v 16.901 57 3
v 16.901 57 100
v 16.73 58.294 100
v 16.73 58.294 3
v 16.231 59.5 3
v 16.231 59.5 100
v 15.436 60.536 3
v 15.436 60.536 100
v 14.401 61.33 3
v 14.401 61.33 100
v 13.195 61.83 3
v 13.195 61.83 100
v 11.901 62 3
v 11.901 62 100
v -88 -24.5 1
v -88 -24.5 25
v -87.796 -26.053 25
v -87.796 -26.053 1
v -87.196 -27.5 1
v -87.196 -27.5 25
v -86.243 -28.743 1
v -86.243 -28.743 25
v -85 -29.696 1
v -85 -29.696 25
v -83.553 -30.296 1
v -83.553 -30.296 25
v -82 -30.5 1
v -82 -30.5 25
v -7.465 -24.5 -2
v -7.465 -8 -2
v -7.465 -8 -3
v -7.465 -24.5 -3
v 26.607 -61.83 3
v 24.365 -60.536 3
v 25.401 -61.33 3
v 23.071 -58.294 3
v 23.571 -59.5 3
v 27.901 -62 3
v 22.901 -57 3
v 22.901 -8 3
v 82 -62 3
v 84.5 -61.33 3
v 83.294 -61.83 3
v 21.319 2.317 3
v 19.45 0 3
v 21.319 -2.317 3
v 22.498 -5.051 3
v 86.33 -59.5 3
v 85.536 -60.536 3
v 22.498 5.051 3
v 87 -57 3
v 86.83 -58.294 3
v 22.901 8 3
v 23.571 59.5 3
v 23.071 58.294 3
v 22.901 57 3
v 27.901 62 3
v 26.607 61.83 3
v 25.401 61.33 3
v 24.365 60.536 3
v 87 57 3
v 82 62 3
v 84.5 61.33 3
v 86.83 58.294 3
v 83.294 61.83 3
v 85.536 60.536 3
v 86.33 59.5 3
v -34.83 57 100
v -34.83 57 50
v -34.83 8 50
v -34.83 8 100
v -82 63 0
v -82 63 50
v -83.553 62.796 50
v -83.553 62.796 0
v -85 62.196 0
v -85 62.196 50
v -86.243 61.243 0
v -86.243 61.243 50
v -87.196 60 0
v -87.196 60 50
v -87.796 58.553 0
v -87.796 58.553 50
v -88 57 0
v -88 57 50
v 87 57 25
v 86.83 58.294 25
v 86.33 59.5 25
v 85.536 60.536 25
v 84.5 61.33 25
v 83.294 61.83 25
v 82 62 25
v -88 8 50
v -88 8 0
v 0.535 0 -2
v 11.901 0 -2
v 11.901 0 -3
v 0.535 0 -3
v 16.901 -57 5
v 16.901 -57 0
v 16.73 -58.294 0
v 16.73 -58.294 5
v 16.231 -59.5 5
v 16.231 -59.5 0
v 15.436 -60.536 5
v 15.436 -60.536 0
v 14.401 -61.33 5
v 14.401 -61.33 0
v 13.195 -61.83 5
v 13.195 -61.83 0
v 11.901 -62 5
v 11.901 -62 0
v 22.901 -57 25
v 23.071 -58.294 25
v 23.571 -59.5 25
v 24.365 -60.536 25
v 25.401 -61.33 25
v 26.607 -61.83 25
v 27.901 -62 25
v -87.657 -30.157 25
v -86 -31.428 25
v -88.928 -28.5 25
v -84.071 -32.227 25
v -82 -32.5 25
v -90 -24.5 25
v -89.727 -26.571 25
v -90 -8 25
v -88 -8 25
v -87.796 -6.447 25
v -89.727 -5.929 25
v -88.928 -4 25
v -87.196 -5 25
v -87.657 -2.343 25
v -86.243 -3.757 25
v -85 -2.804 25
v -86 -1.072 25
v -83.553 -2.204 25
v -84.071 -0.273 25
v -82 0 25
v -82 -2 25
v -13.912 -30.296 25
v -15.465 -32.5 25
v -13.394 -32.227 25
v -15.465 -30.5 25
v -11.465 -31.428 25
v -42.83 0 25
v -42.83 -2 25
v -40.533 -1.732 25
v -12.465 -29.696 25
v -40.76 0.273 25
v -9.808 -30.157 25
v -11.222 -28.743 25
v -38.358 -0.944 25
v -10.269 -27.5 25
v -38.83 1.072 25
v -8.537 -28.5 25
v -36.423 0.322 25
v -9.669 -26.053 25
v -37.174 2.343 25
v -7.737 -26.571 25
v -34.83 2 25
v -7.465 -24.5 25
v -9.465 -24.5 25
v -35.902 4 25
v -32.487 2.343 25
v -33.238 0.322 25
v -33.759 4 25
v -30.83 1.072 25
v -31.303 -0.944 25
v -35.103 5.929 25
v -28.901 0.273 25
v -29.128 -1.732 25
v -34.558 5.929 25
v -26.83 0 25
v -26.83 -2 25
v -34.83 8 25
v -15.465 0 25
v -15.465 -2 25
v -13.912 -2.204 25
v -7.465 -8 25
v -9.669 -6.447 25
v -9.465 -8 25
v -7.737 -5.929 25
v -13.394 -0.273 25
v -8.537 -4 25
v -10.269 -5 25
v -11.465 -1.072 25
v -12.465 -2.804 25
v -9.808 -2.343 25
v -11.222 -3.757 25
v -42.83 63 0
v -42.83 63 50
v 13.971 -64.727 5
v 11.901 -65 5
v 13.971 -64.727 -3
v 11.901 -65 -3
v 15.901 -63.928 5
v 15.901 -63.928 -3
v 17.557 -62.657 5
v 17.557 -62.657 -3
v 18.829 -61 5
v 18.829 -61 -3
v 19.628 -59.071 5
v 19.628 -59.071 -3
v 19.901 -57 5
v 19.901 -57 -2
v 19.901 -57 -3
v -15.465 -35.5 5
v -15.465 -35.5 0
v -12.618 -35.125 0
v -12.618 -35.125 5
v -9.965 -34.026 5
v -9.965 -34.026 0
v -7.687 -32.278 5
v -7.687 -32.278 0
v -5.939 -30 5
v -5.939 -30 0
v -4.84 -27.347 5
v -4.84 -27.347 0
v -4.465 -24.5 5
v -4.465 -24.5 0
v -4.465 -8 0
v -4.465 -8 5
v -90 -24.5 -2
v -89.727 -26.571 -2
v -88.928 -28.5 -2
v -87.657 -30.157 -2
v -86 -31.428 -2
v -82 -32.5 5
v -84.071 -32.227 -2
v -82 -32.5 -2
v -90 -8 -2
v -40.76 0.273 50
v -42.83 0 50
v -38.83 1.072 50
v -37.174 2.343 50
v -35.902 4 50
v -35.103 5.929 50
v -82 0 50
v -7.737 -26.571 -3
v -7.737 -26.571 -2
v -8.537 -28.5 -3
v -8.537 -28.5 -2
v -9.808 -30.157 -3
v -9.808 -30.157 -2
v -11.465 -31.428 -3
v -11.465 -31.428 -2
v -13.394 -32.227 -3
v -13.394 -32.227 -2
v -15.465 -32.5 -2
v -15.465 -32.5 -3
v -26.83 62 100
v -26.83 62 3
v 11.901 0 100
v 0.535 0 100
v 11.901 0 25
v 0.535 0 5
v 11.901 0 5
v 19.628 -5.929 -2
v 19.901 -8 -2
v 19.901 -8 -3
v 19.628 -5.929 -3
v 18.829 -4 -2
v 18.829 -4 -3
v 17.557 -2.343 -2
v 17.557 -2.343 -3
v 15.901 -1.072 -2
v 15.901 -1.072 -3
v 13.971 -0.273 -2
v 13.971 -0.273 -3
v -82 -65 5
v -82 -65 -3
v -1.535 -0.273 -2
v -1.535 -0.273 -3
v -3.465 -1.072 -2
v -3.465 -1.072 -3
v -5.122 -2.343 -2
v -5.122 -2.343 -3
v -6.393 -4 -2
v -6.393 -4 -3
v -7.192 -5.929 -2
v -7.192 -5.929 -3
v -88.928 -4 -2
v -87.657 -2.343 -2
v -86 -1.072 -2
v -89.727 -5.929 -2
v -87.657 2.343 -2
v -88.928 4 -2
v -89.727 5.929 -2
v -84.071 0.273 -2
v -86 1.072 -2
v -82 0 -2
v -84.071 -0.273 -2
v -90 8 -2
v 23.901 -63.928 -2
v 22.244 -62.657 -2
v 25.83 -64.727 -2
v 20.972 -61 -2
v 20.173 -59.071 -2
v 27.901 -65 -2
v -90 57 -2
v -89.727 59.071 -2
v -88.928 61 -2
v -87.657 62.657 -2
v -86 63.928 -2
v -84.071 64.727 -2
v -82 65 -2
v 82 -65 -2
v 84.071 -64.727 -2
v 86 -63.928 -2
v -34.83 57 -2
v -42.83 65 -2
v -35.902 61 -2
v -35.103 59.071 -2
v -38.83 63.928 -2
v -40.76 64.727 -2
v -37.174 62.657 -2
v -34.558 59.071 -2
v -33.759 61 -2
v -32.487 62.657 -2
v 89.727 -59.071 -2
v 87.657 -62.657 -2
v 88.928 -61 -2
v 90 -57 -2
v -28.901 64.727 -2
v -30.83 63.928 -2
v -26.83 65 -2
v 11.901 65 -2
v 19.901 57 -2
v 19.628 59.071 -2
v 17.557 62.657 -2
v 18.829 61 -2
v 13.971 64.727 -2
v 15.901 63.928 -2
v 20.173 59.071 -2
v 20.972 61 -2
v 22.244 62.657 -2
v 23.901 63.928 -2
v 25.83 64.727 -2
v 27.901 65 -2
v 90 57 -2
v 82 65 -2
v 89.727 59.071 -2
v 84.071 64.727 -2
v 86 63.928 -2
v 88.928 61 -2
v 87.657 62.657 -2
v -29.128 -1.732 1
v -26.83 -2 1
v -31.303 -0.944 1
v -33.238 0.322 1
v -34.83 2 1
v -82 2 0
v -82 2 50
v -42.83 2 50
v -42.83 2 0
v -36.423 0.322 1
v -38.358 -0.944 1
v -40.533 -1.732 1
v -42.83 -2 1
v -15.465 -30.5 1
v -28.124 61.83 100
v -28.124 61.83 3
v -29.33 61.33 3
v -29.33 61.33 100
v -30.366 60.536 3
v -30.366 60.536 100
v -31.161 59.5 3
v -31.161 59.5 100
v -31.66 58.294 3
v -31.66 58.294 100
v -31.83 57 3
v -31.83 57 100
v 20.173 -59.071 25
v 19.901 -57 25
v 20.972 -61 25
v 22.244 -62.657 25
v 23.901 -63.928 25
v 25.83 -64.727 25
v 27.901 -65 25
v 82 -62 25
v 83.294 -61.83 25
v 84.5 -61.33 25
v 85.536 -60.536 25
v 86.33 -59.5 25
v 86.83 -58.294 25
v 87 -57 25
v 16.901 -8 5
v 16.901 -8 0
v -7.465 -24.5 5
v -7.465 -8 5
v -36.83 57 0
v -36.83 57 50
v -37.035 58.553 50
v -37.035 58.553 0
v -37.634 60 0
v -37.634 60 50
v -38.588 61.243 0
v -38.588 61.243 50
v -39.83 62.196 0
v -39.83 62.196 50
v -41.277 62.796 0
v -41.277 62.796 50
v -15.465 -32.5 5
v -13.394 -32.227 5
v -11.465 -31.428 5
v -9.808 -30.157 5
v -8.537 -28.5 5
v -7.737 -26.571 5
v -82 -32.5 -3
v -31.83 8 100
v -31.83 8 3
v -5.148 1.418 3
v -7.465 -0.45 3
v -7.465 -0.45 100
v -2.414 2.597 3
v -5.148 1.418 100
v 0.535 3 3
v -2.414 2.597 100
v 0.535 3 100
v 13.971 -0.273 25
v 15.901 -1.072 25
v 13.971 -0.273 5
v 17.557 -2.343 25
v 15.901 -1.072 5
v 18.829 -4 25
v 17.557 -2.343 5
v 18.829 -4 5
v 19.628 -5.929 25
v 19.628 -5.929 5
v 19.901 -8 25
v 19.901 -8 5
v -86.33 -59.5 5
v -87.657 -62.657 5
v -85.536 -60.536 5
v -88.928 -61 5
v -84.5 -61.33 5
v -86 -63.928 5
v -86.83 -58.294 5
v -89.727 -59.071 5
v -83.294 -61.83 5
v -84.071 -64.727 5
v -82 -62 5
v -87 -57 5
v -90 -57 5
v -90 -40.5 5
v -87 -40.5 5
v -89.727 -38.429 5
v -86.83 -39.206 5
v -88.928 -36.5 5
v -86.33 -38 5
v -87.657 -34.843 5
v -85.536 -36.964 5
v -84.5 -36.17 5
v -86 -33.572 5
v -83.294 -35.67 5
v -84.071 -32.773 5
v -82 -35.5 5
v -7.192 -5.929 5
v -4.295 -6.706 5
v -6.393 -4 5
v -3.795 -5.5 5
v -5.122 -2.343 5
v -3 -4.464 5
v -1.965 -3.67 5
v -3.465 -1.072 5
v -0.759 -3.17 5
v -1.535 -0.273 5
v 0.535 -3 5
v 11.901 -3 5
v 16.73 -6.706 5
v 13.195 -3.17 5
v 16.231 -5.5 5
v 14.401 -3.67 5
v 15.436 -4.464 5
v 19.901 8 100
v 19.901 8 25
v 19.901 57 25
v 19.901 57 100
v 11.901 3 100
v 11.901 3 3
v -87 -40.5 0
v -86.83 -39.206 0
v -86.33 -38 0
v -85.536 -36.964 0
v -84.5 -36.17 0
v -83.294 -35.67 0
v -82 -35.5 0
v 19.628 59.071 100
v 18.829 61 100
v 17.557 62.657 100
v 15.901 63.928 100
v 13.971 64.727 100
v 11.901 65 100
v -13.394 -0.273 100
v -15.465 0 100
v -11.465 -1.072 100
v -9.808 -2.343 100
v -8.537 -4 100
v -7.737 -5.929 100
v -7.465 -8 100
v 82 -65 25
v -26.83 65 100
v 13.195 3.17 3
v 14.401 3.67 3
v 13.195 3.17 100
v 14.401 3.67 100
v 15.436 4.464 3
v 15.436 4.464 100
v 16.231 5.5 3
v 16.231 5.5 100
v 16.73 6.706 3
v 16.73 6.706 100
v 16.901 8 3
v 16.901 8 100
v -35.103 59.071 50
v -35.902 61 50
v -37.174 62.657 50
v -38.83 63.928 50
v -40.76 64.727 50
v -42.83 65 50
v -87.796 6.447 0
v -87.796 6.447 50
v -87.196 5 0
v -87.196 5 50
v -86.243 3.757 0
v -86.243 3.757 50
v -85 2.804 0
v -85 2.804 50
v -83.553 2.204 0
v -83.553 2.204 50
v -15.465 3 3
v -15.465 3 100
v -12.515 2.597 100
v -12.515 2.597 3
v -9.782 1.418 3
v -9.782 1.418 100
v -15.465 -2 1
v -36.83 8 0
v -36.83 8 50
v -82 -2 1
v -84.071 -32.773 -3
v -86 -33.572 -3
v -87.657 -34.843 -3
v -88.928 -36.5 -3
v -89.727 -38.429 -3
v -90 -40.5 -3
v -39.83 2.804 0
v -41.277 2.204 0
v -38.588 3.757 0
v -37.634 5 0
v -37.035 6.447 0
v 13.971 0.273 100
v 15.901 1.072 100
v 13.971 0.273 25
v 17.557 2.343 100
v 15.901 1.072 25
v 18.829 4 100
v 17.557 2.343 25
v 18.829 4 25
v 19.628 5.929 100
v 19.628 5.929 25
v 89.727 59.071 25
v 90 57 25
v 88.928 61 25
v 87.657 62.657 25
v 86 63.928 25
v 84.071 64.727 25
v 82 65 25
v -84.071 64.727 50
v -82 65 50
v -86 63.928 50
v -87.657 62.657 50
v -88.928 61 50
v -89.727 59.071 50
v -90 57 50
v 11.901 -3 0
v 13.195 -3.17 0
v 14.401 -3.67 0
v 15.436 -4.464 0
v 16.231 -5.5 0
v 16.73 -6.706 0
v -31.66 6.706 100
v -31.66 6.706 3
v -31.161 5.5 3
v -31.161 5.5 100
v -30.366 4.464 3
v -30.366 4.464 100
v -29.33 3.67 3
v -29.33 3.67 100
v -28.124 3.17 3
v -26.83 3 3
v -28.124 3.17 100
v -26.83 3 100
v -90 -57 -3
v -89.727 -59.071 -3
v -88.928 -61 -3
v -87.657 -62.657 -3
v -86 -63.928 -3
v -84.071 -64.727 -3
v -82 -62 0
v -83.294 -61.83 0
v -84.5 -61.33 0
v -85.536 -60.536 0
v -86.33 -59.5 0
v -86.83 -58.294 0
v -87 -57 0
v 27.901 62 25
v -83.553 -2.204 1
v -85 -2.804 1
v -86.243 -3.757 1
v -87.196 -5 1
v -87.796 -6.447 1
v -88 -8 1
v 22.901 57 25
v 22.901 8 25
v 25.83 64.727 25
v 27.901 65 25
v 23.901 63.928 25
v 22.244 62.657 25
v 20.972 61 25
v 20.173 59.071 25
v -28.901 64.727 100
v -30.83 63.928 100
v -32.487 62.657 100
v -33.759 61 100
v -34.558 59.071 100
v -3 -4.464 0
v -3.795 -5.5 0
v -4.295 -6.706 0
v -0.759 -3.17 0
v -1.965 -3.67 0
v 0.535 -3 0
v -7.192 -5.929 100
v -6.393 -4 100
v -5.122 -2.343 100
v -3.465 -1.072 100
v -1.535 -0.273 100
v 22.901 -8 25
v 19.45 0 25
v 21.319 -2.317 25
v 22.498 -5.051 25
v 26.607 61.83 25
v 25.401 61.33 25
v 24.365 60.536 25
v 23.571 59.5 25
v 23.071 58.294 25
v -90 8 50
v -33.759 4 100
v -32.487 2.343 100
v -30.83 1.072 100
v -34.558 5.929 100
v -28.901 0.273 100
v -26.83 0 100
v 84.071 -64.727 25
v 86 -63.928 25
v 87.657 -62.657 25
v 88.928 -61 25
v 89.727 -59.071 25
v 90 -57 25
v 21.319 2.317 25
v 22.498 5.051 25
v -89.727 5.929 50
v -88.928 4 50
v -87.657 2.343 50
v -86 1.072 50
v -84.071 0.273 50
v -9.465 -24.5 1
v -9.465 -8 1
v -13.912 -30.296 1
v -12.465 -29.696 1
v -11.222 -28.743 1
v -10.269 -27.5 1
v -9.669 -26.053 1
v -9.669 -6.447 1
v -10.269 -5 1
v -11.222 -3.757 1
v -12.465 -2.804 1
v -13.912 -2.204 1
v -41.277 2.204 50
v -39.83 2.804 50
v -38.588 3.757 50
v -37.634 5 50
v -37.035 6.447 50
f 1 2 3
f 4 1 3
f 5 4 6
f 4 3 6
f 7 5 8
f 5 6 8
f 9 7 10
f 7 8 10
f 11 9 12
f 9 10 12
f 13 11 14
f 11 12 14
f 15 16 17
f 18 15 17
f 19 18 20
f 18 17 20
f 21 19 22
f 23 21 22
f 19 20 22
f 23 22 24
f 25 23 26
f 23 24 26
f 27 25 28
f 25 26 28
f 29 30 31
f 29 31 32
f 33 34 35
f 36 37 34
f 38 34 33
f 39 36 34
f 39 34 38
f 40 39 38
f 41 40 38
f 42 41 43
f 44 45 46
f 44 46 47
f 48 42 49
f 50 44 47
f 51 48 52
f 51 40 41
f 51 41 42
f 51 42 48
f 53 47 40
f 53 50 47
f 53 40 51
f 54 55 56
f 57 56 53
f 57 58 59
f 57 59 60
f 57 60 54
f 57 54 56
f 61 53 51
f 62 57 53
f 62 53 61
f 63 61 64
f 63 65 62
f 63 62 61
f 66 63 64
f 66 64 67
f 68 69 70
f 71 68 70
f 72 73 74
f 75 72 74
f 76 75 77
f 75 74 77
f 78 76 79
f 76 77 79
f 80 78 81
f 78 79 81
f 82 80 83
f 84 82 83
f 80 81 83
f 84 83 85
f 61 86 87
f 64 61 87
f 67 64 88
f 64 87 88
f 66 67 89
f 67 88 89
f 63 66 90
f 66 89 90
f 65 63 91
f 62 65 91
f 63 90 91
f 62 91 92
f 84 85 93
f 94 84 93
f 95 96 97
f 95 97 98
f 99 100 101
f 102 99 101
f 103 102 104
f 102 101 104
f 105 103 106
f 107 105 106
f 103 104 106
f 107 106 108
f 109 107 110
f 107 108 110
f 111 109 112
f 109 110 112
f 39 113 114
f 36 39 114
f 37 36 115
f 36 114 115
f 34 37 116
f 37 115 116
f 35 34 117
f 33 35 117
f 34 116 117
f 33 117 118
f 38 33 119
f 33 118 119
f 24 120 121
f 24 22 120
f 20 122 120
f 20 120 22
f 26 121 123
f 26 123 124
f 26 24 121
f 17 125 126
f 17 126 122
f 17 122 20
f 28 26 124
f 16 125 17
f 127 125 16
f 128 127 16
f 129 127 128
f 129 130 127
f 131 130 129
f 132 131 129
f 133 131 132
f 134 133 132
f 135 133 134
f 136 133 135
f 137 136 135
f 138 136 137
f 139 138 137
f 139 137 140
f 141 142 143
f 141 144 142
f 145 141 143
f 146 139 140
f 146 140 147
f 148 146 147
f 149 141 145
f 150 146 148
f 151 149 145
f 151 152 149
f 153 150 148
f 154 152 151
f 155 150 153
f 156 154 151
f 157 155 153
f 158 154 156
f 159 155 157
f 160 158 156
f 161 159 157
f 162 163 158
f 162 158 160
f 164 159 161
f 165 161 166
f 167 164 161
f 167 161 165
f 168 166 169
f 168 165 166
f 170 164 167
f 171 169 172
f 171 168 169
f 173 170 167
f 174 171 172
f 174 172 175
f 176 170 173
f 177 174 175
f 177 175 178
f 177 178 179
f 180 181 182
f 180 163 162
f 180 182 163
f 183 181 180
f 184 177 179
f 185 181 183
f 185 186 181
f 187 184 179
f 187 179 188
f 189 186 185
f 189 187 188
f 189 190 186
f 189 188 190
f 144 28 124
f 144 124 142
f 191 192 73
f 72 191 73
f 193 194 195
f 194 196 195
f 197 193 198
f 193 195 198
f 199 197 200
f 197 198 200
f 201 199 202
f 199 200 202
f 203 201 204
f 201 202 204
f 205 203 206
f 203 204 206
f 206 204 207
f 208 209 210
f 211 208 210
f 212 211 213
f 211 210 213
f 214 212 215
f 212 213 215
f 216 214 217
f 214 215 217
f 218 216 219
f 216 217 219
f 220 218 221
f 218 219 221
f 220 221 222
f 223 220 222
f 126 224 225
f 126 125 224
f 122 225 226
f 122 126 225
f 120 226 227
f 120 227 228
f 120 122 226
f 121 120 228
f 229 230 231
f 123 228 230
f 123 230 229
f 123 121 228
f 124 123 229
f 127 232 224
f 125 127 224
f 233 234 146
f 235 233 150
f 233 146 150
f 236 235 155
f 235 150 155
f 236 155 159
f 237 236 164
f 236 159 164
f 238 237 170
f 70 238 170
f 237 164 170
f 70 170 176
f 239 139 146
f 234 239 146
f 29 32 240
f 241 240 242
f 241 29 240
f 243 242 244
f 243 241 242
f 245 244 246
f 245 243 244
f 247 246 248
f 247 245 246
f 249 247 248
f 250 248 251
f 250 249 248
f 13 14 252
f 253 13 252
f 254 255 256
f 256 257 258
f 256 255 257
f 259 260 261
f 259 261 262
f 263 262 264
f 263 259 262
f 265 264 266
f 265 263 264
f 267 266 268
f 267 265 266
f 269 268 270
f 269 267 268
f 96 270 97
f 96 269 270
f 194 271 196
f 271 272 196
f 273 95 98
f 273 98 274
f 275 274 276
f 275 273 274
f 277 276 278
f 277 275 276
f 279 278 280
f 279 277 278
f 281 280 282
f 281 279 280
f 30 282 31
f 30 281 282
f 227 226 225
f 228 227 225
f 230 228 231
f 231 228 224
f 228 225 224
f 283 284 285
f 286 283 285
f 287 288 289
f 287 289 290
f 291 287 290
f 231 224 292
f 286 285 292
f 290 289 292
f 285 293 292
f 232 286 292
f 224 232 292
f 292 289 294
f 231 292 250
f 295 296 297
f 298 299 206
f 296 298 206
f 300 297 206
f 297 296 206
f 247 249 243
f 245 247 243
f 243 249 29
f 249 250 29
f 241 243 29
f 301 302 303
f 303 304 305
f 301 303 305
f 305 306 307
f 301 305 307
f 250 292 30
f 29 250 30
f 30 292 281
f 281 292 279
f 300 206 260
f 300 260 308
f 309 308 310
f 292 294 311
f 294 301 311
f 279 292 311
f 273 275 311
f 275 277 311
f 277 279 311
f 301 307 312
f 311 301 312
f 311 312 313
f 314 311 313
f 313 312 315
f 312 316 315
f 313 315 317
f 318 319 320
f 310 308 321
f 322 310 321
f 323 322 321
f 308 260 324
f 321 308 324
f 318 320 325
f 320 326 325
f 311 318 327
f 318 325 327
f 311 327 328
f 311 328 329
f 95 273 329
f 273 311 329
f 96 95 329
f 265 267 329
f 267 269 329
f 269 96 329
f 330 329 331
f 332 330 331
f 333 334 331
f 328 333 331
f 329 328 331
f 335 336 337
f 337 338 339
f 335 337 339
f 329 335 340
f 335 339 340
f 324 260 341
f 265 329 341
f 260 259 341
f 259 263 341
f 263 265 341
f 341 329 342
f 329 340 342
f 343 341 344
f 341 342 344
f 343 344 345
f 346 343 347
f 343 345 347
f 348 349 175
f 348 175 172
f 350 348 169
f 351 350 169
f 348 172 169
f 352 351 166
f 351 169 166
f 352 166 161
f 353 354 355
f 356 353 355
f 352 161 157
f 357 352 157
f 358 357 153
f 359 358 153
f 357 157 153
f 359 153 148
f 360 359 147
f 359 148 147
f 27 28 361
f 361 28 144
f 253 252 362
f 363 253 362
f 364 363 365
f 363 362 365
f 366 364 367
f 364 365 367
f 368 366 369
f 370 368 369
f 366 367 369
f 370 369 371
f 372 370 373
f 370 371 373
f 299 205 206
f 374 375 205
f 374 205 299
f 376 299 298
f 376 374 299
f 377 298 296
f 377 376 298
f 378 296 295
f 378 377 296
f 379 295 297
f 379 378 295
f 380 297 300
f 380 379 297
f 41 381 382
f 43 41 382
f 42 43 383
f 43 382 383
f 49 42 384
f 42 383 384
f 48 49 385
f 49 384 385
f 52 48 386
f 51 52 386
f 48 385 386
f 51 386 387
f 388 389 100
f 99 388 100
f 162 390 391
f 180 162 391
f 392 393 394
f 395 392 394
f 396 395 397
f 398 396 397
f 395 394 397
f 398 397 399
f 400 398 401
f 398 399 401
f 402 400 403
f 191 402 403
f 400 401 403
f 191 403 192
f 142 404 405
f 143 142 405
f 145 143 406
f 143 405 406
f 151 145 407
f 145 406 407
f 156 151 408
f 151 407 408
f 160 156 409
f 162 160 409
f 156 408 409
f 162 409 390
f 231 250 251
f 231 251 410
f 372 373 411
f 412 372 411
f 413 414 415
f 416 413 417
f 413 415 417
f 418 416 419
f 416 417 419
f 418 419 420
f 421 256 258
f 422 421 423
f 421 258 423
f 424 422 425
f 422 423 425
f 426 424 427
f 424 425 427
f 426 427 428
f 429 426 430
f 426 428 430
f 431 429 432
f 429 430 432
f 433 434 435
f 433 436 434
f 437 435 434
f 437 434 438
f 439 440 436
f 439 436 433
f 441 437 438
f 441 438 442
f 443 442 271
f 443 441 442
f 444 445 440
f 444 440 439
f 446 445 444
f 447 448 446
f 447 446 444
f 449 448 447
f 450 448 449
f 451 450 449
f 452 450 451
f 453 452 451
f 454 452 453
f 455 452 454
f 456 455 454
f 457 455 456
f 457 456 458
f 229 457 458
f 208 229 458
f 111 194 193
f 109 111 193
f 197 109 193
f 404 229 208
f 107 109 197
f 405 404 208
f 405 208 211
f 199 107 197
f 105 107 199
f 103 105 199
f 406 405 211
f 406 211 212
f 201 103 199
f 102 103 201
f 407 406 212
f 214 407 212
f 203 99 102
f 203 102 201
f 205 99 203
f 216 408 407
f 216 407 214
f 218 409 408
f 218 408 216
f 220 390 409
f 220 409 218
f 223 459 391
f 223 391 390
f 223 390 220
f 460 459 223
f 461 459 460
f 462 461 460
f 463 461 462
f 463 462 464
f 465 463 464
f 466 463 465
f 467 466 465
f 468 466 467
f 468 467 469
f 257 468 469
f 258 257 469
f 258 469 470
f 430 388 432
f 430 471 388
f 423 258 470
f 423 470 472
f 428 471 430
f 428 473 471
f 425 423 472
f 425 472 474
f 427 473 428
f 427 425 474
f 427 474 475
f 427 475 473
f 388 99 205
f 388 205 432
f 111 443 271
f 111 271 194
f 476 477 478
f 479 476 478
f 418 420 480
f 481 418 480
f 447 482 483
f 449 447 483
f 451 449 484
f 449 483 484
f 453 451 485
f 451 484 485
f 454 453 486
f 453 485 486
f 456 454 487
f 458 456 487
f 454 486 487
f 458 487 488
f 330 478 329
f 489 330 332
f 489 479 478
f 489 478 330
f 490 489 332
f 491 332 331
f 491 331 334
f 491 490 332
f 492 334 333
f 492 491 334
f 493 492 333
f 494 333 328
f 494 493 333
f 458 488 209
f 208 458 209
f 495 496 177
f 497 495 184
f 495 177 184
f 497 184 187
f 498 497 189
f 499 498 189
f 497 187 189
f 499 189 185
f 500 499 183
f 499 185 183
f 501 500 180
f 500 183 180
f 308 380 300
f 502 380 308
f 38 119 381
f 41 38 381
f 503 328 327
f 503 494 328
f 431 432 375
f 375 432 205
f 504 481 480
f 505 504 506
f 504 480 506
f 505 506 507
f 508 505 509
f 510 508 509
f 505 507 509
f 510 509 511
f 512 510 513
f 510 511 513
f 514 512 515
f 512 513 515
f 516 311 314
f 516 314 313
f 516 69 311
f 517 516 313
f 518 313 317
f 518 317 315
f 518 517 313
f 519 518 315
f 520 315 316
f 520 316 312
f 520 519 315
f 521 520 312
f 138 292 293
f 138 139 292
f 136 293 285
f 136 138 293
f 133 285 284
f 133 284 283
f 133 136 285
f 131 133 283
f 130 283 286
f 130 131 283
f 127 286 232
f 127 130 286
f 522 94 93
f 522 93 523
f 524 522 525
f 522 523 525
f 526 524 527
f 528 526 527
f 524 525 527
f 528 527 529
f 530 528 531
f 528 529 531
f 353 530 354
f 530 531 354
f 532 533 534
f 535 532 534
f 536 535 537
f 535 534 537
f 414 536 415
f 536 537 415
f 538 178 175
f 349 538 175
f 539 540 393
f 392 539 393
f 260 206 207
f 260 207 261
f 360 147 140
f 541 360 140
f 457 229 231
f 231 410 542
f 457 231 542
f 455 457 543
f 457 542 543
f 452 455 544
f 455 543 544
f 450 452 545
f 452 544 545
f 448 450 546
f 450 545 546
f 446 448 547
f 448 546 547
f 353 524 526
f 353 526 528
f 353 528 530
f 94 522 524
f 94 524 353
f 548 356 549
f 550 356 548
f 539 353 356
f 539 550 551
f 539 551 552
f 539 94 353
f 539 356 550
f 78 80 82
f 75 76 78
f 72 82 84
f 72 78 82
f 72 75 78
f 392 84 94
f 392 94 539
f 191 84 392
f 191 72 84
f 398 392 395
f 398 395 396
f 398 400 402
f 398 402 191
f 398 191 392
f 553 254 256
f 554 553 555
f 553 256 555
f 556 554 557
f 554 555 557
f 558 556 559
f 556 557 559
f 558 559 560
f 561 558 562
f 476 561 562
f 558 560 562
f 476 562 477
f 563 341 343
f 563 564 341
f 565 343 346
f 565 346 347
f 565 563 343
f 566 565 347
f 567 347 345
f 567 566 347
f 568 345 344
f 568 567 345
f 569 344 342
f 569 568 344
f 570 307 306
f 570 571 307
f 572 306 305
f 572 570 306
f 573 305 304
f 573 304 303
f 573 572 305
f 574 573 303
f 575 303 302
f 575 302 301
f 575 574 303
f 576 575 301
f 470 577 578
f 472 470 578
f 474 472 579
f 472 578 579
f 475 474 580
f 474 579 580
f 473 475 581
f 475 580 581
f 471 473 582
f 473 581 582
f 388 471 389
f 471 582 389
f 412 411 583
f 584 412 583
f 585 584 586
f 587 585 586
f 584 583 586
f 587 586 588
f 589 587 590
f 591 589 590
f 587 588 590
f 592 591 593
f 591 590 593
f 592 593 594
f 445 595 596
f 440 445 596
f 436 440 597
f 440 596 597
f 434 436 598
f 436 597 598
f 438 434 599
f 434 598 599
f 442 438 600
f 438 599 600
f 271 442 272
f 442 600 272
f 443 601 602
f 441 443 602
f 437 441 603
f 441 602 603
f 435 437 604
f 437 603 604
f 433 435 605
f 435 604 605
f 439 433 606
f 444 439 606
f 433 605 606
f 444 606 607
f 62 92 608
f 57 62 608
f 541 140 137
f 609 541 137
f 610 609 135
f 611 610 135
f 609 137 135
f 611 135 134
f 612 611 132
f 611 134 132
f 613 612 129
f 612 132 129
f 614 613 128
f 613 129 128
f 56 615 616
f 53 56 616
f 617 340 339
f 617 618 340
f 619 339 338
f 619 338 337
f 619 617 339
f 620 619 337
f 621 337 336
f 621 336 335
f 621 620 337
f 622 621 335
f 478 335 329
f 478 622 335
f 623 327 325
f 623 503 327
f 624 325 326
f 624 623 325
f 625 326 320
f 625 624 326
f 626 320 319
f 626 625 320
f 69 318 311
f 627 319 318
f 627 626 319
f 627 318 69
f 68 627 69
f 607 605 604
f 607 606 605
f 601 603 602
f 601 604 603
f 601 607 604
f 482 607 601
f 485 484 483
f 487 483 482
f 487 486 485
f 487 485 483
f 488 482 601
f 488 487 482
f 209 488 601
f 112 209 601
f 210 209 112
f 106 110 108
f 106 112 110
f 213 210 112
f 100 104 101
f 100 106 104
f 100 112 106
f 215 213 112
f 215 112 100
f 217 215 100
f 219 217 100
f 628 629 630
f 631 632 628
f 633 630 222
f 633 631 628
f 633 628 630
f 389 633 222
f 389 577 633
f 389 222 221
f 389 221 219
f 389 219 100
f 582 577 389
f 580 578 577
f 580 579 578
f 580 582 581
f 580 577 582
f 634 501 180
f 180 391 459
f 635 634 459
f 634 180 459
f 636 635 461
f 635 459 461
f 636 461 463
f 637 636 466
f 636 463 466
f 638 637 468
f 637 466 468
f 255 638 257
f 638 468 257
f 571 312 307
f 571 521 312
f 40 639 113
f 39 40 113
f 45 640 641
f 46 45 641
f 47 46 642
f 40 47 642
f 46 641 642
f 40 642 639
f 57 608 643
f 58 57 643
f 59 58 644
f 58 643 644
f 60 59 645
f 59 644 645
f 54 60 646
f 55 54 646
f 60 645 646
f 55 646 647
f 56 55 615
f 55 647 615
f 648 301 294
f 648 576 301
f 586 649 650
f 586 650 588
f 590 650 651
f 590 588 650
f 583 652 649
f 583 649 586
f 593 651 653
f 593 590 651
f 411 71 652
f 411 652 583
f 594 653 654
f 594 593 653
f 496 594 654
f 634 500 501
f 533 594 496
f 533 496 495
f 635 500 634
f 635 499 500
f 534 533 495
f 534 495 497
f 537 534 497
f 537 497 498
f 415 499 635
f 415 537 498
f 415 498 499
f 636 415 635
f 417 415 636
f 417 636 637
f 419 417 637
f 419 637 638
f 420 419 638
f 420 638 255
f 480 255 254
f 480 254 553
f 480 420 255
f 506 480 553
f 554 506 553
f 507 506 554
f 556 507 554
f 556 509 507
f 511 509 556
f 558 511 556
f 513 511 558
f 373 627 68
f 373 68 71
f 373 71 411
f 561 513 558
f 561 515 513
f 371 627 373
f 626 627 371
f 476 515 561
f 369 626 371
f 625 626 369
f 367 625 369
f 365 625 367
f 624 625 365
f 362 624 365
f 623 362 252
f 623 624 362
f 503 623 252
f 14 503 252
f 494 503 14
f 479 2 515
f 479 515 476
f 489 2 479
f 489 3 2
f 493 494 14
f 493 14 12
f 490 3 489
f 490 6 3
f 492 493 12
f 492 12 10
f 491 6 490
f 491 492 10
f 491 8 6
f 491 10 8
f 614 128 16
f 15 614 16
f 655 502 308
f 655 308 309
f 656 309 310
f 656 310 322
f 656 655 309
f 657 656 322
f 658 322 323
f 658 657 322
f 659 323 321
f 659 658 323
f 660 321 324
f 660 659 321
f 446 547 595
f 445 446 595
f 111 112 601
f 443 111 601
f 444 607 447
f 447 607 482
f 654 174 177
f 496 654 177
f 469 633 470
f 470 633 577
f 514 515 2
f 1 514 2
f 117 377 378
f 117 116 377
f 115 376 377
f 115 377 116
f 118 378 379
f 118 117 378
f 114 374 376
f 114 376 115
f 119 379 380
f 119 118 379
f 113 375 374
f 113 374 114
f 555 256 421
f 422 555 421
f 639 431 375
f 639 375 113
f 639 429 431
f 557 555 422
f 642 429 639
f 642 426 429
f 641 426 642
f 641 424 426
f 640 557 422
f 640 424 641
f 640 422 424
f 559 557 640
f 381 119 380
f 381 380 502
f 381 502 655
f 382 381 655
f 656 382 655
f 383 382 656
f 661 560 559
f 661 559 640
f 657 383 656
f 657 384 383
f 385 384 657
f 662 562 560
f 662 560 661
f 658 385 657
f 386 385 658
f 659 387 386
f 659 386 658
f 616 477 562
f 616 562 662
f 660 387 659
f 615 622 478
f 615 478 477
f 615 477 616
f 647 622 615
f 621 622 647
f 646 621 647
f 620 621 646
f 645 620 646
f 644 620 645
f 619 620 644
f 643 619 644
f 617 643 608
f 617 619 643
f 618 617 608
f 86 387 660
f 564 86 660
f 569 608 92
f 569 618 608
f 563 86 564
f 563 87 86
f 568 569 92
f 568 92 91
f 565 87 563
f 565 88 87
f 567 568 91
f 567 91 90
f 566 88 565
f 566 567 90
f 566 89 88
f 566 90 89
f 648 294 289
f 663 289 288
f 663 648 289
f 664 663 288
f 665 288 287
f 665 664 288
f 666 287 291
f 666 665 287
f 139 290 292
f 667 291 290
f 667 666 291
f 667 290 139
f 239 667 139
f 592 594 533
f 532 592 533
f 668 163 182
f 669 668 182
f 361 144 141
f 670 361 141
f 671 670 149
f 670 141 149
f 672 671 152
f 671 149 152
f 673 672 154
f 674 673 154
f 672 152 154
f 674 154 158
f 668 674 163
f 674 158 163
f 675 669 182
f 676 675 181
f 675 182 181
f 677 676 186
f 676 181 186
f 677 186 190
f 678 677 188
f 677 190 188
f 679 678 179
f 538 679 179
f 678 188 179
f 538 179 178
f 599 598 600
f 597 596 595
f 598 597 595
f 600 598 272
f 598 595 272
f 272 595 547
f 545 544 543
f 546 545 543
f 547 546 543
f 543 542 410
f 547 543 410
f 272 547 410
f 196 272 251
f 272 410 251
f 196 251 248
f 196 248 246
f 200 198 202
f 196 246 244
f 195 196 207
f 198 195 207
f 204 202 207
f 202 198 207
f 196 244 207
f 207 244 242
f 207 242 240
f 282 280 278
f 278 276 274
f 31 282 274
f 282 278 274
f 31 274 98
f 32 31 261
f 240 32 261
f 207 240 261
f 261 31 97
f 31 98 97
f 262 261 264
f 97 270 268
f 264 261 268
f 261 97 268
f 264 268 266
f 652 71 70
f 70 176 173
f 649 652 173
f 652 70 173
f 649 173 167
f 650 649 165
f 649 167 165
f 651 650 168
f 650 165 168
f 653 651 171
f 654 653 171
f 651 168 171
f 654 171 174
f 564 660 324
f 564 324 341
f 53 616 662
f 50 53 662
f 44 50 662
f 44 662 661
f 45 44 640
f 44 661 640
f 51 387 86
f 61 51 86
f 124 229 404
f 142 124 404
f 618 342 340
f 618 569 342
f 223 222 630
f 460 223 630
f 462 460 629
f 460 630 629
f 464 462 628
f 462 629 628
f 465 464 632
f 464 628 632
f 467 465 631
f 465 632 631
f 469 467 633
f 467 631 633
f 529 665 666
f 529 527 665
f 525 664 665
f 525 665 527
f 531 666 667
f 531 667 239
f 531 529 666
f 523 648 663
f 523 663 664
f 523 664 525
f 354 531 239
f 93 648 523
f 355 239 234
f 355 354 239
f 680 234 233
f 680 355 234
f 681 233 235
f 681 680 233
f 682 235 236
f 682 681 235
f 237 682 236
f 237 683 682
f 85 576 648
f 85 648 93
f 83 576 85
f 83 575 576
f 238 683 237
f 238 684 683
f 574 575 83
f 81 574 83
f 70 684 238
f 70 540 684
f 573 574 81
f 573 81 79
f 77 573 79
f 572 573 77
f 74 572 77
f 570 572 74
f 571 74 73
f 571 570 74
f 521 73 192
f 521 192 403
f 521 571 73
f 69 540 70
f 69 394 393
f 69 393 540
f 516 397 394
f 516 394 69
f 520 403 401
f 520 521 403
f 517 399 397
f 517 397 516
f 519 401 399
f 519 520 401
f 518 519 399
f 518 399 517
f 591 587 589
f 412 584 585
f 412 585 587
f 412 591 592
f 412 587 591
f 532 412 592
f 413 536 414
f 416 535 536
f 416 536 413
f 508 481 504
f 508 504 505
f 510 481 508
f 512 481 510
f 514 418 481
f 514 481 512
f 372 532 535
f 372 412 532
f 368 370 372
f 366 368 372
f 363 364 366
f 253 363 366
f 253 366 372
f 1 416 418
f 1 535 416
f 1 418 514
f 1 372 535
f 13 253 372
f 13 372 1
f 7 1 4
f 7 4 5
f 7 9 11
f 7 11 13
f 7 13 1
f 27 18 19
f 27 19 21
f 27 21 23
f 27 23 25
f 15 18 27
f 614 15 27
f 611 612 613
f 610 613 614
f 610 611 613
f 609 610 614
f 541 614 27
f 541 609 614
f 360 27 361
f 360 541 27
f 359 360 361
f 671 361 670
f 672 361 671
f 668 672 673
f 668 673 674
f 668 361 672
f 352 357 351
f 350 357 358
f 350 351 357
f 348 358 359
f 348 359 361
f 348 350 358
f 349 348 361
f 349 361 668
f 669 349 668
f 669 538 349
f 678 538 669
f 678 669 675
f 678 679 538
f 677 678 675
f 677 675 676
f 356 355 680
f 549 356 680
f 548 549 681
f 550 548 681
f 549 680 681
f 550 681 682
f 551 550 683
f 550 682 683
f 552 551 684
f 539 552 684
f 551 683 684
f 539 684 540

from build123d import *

# Parameters (mm, degrees)
F1_DEPTH  = 3
F2_DEPTH  = 50
F3_DEPTH  = 100
F4_DEPTH  = 25
F5_DEPTH  = 25
F7_DEPTH  = 22
F8_DEPTH  = 2
F10_DEPTH = 97
F12_DEPTH = 50
F14_DEPTH = 24
F16_DEPTH = 5


with BuildPart() as f1:
    # F0 (on Top) → F1 (new body)
    with BuildSketch(Plane.XY):
        with BuildLine():
            Line((-82, -65), (11.900635, -65))
            ThreePointArc((11.900635, -65), (17.557489, -62.656854), (19.900635, -57))
            Line((19.900635, -57), (19.900635, -8))
            ThreePointArc((19.900635, -8), (17.557489, -2.343146), (11.900635, 0))
            Line((11.900635, 0), (0.535129, 0))
            ThreePointArc((0.535129, 0), (-5.121725, -2.343146), (-7.464871, -8))
            Line((-7.464871, -8), (-7.464871, -24.5))
            ThreePointArc((-7.464871, -24.5), (-9.808017, -30.156854), (-15.464871, -32.5))
            Line((-15.464871, -32.5), (-82, -32.5))
            ThreePointArc((-82, -32.5), (-87.656854, -34.843146), (-90, -40.5))
            Line((-90, -40.5), (-90, -57))
            ThreePointArc((-90, -57), (-87.656854, -62.656854), (-82, -65))
        make_face()
    extrude(amount=-F1_DEPTH)



with BuildPart() as f2:
    # F0 (on Top) → F2 (new body)
    with BuildSketch(Plane.XY):
        with BuildLine():
            ThreePointArc((-90, 8), (-87.656854, 2.343146), (-82, 0))
            Line((-82, 0), (-42.830377, 0))
            ThreePointArc((-42.830377, 0), (-37.173522, 2.343146), (-34.830377, 8))
            Line((-34.830377, 8), (-34.830377, 57))
            ThreePointArc((-34.830377, 57), (-37.173522, 62.656854), (-42.830377, 65))
            Line((-42.830377, 65), (-82, 65))
            ThreePointArc((-82, 65), (-87.656854, 62.656854), (-90, 57))
            Line((-90, 57), (-90, 8))
        make_face()
    extrude(amount=F2_DEPTH)


with BuildPart() as f1_1:
    add(f1.part)

    add(f2.part)  # F3 merges F2
    # F0 (on Top) → F3 (join)
    with BuildSketch(Plane.XY):
        with BuildLine():
            Line((0.535129, 0), (11.900635, 0))
            ThreePointArc((11.900635, 0), (17.557489, 2.343146), (19.900635, 8))
            Line((19.900635, 8), (19.900635, 57))
            ThreePointArc((19.900635, 57), (17.557489, 62.656854), (11.900635, 65))
            Line((11.900635, 65), (-26.830377, 65))
            ThreePointArc((-26.830377, 65), (-32.487231, 62.656854), (-34.830377, 57))
            Line((-34.830377, 57), (-34.830377, 8))
            ThreePointArc((-34.830377, 8), (-32.487231, 2.343146), (-26.830377, 0))
            Line((-26.830377, 0), (-15.464871, 0))
            ThreePointArc((-15.464871, 0), (-9.808017, -2.343146), (-7.464871, -8))
            ThreePointArc((-7.464871, -8), (-5.121725, -2.343146), (0.535129, 0))
        make_face()
    extrude(amount=F3_DEPTH)

    # F0 (on Top) → F4 (join)
    with BuildSketch(Plane.XY):
        with BuildLine():
            ThreePointArc((-90, -24.5), (-87.656854, -30.156854), (-82, -32.5))
            Line((-82, -32.5), (-15.464871, -32.5))
            ThreePointArc((-15.464871, -32.5), (-9.808017, -30.156854), (-7.464871, -24.5))
            Line((-7.464871, -24.5), (-7.464871, -8))
            ThreePointArc((-7.464871, -8), (-9.808017, -2.343146), (-15.464871, 0))
            Line((-15.464871, 0), (-26.830377, 0))
            ThreePointArc((-26.830377, 0), (-32.487231, 2.343146), (-34.830377, 8))
            ThreePointArc((-34.830377, 8), (-37.173522, 2.343146), (-42.830377, 0))
            Line((-42.830377, 0), (-82, 0))
            ThreePointArc((-82, 0), (-87.656854, -2.343146), (-90, -8))
            Line((-90, -8), (-90, -24.5))
        make_face()
    extrude(amount=F4_DEPTH)

    # F0 (on Top) → F5 (join)
    with BuildSketch(Plane.XY):
        with BuildLine():
            Line((19.900635, -8), (19.900635, -57))
            ThreePointArc((19.900635, -57), (22.243781, -62.656854), (27.900635, -65))
            Line((27.900635, -65), (82, -65))
            ThreePointArc((82, -65), (87.656854, -62.656854), (90, -57))
            Line((90, -57), (90, 57))
            ThreePointArc((90, 57), (87.656854, 62.656854), (82, 65))
            Line((82, 65), (27.900635, 65))
            ThreePointArc((27.900635, 65), (22.243781, 62.656854), (19.900635, 57))
            Line((19.900635, 57), (19.900635, 8))
            ThreePointArc((19.900635, 8), (17.557489, 2.343146), (11.900635, 0))
            ThreePointArc((11.900635, 0), (17.557489, -2.343146), (19.900635, -8))
        make_face()
    extrude(amount=F5_DEPTH)

    # F6 (on face) → F7 (cut)
    with BuildSketch(Plane.XY.offset(25)):
        with BuildLine():
            Line((22.900635, 57), (22.900635, 8))
            ThreePointArc((22.900635, 8), (22.001332, 3.643865), (19.450469, 0))
            ThreePointArc((19.450469, 0), (22.001332, -3.643865), (22.900635, -8))
            Line((22.900635, -8), (22.900635, -57))
            ThreePointArc((22.900635, -57), (24.365101, -60.535534), (27.900635, -62))
            Line((27.900635, -62), (82, -62))
            ThreePointArc((82, -62), (85.535534, -60.535534), (87, -57))
            Line((87, -57), (87, 57))
            ThreePointArc((87, 57), (85.535534, 60.535534), (82, 62))
            Line((82, 62), (27.900635, 62))
            ThreePointArc((27.900635, 62), (24.365101, 60.535534), (22.900635, 57))
        make_face()
    extrude(amount=-F7_DEPTH, mode=Mode.SUBTRACT)

    # F0 (on Top) → F8 (join)
    with BuildSketch(Plane.XY):
        with BuildLine():
            Line((19.900635, -8), (19.900635, -57))
            ThreePointArc((19.900635, -57), (22.243781, -62.656854), (27.900635, -65))
            Line((27.900635, -65), (82, -65))
            ThreePointArc((82, -65), (87.656854, -62.656854), (90, -57))
            Line((90, -57), (90, 57))
            ThreePointArc((90, 57), (87.656854, 62.656854), (82, 65))
            Line((82, 65), (27.900635, 65))
            ThreePointArc((27.900635, 65), (22.243781, 62.656854), (19.900635, 57))
            Line((19.900635, 57), (19.900635, 8))
            ThreePointArc((19.900635, 8), (17.557489, 2.343146), (11.900635, 0))
            ThreePointArc((11.900635, 0), (17.557489, -2.343146), (19.900635, -8))
        make_face()
        with BuildLine():
            Line((0.535129, 0), (11.900635, 0))
            ThreePointArc((11.900635, 0), (17.557489, 2.343146), (19.900635, 8))
            Line((19.900635, 8), (19.900635, 57))
            ThreePointArc((19.900635, 57), (17.557489, 62.656854), (11.900635, 65))
            Line((11.900635, 65), (-26.830377, 65))
            ThreePointArc((-26.830377, 65), (-32.487231, 62.656854), (-34.830377, 57))
            Line((-34.830377, 57), (-34.830377, 8))
            ThreePointArc((-34.830377, 8), (-32.487231, 2.343146), (-26.830377, 0))
            Line((-26.830377, 0), (-15.464871, 0))
            ThreePointArc((-15.464871, 0), (-9.808017, -2.343146), (-7.464871, -8))
            ThreePointArc((-7.464871, -8), (-5.121725, -2.343146), (0.535129, 0))
        make_face()
        with BuildLine():
            Line((-82, -65), (11.900635, -65))
            ThreePointArc((11.900635, -65), (17.557489, -62.656854), (19.900635, -57))
            Line((19.900635, -57), (19.900635, -8))
            ThreePointArc((19.900635, -8), (17.557489, -2.343146), (11.900635, 0))
            Line((11.900635, 0), (0.535129, 0))
            ThreePointArc((0.535129, 0), (-5.121725, -2.343146), (-7.464871, -8))
            Line((-7.464871, -8), (-7.464871, -24.5))
            ThreePointArc((-7.464871, -24.5), (-9.808017, -30.156854), (-15.464871, -32.5))
            Line((-15.464871, -32.5), (-82, -32.5))
            ThreePointArc((-82, -32.5), (-87.656854, -34.843146), (-90, -40.5))
            Line((-90, -40.5), (-90, -57))
            ThreePointArc((-90, -57), (-87.656854, -62.656854), (-82, -65))
        make_face()
        with BuildLine():
            ThreePointArc((-90, -24.5), (-87.656854, -30.156854), (-82, -32.5))
            Line((-82, -32.5), (-15.464871, -32.5))
            ThreePointArc((-15.464871, -32.5), (-9.808017, -30.156854), (-7.464871, -24.5))
            Line((-7.464871, -24.5), (-7.464871, -8))
            ThreePointArc((-7.464871, -8), (-9.808017, -2.343146), (-15.464871, 0))
            Line((-15.464871, 0), (-26.830377, 0))
            ThreePointArc((-26.830377, 0), (-32.487231, 2.343146), (-34.830377, 8))
            ThreePointArc((-34.830377, 8), (-37.173522, 2.343146), (-42.830377, 0))
            Line((-42.830377, 0), (-82, 0))
            ThreePointArc((-82, 0), (-87.656854, -2.343146), (-90, -8))
            Line((-90, -8), (-90, -24.5))
        make_face()
        with BuildLine():
            ThreePointArc((-90, 8), (-87.656854, 2.343146), (-82, 0))
            Line((-82, 0), (-42.830377, 0))
            ThreePointArc((-42.830377, 0), (-37.173522, 2.343146), (-34.830377, 8))
            Line((-34.830377, 8), (-34.830377, 57))
            ThreePointArc((-34.830377, 57), (-37.173522, 62.656854), (-42.830377, 65))
            Line((-42.830377, 65), (-82, 65))
            ThreePointArc((-82, 65), (-87.656854, 62.656854), (-90, 57))
            Line((-90, 57), (-90, 8))
        make_face()
    extrude(amount=-F8_DEPTH)

    # F9 (on face) → F10 (cut)
    with BuildSketch(Plane.XY.offset(100)):
        with BuildLine():
            Line((-26.830377, 3), (-15.464871, 3))
            ThreePointArc((-15.464871, 3), (-11.108736, 2.100697), (-7.464871, -0.450166))
            ThreePointArc((-7.464871, -0.450166), (-3.821006, 2.100697), (0.535129, 3))
            Line((0.535129, 3), (11.900635, 3))
            ThreePointArc((11.900635, 3), (15.436169, 4.464466), (16.900635, 8))
            Line((16.900635, 8), (16.900635, 57))
            ThreePointArc((16.900635, 57), (15.436169, 60.535534), (11.900635, 62))
            Line((11.900635, 62), (-26.830377, 62))
            ThreePointArc((-26.830377, 62), (-30.36591, 60.535534), (-31.830377, 57))
            Line((-31.830377, 57), (-31.830377, 8))
            ThreePointArc((-31.830377, 8), (-30.36591, 4.464466), (-26.830377, 3))
        make_face()
    extrude(amount=-F10_DEPTH, mode=Mode.SUBTRACT)

    # F11 (on face) → F12 (cut)
    with BuildSketch(Plane.XY.offset(50)):
        with BuildLine():
            Line((-88, 57), (-88, 8))
            ThreePointArc((-88, 8), (-86.242641, 3.757359), (-82, 2))
            Line((-82, 2), (-42.830377, 2))
            ThreePointArc((-42.830377, 2), (-38.587736, 3.757359), (-36.830377, 8))
            Line((-36.830377, 8), (-36.830377, 57))
            ThreePointArc((-36.830377, 57), (-38.587736, 61.242641), (-42.830377, 63))
            Line((-42.830377, 63), (-82, 63))
            ThreePointArc((-82, 63), (-86.242641, 61.242641), (-88, 57))
        make_face()
    extrude(amount=-F12_DEPTH, mode=Mode.SUBTRACT)

    # F13 (on face) → F14 (cut)
    with BuildSketch(Plane.XY.offset(25)):
        with BuildLine():
            Line((-88, -8), (-88, -24.5))
            ThreePointArc((-88, -24.5), (-86.242641, -28.742641), (-82, -30.5))
            Line((-82, -30.5), (-15.464871, -30.5))
            ThreePointArc((-15.464871, -30.5), (-11.22223, -28.742641), (-9.464871, -24.5))
            Line((-9.464871, -24.5), (-9.464871, -8))
            ThreePointArc((-9.464871, -8), (-11.22223, -3.757359), (-15.464871, -2))
            Line((-15.464871, -2), (-26.830377, -2))
            ThreePointArc((-26.830377, -2), (-31.302512, -0.944272), (-34.830377, 2))
            ThreePointArc((-34.830377, 2), (-38.358241, -0.944272), (-42.830377, -2))
            Line((-42.830377, -2), (-82, -2))
            ThreePointArc((-82, -2), (-86.242641, -3.757359), (-88, -8))
        make_face()
    extrude(amount=-F14_DEPTH, mode=Mode.SUBTRACT)

    # F15 (on face) → F16 (join)
    with BuildSketch(Plane.XY):
        with BuildLine():
            ThreePointArc((-90, -57), (-87.656854, -62.656854), (-82, -65))
            Line((-82, -65), (11.900635, -65))
            ThreePointArc((11.900635, -65), (17.557489, -62.656854), (19.900635, -57))
            Line((19.900635, -57), (19.900635, -8))
            ThreePointArc((19.900635, -8), (17.557489, -2.343146), (11.900635, 0))
            Line((11.900635, 0), (0.535129, 0))
            ThreePointArc((0.535129, 0), (-5.121725, -2.343146), (-7.464871, -8))
            Line((-7.464871, -8), (-7.464871, -24.5))
            ThreePointArc((-7.464871, -24.5), (-9.808017, -30.156854), (-15.464871, -32.5))
            Line((-15.464871, -32.5), (-82, -32.5))
            ThreePointArc((-82, -32.5), (-87.656854, -34.843146), (-90, -40.5))
            Line((-90, -40.5), (-90, -57))
        make_face()
        with BuildLine():
            ThreePointArc((16.900635, -57), (15.436169, -60.535534), (11.900635, -62))
            Line((11.900635, -62), (-82, -62))
            ThreePointArc((-82, -62), (-85.535534, -60.535534), (-87, -57))
            Line((-87, -57), (-87, -40.5))
            ThreePointArc((-87, -40.5), (-85.535534, -36.964466), (-82, -35.5))
            Line((-82, -35.5), (-15.464871, -35.5))
            ThreePointArc((-15.464871, -35.5), (-7.686696, -32.278175), (-4.464871, -24.5))
            Line((-4.464871, -24.5), (-4.464871, -8))
            ThreePointArc((-4.464871, -8), (-3.000405, -4.464466), (0.535129, -3))
            Line((0.535129, -3), (11.900635, -3))
            ThreePointArc((11.900635, -3), (15.436169, -4.464466), (16.900635, -8))
            Line((16.900635, -8), (16.900635, -57))
        make_face(mode=Mode.SUBTRACT)
    extrude(amount=F16_DEPTH)


solid = f1_1.part
